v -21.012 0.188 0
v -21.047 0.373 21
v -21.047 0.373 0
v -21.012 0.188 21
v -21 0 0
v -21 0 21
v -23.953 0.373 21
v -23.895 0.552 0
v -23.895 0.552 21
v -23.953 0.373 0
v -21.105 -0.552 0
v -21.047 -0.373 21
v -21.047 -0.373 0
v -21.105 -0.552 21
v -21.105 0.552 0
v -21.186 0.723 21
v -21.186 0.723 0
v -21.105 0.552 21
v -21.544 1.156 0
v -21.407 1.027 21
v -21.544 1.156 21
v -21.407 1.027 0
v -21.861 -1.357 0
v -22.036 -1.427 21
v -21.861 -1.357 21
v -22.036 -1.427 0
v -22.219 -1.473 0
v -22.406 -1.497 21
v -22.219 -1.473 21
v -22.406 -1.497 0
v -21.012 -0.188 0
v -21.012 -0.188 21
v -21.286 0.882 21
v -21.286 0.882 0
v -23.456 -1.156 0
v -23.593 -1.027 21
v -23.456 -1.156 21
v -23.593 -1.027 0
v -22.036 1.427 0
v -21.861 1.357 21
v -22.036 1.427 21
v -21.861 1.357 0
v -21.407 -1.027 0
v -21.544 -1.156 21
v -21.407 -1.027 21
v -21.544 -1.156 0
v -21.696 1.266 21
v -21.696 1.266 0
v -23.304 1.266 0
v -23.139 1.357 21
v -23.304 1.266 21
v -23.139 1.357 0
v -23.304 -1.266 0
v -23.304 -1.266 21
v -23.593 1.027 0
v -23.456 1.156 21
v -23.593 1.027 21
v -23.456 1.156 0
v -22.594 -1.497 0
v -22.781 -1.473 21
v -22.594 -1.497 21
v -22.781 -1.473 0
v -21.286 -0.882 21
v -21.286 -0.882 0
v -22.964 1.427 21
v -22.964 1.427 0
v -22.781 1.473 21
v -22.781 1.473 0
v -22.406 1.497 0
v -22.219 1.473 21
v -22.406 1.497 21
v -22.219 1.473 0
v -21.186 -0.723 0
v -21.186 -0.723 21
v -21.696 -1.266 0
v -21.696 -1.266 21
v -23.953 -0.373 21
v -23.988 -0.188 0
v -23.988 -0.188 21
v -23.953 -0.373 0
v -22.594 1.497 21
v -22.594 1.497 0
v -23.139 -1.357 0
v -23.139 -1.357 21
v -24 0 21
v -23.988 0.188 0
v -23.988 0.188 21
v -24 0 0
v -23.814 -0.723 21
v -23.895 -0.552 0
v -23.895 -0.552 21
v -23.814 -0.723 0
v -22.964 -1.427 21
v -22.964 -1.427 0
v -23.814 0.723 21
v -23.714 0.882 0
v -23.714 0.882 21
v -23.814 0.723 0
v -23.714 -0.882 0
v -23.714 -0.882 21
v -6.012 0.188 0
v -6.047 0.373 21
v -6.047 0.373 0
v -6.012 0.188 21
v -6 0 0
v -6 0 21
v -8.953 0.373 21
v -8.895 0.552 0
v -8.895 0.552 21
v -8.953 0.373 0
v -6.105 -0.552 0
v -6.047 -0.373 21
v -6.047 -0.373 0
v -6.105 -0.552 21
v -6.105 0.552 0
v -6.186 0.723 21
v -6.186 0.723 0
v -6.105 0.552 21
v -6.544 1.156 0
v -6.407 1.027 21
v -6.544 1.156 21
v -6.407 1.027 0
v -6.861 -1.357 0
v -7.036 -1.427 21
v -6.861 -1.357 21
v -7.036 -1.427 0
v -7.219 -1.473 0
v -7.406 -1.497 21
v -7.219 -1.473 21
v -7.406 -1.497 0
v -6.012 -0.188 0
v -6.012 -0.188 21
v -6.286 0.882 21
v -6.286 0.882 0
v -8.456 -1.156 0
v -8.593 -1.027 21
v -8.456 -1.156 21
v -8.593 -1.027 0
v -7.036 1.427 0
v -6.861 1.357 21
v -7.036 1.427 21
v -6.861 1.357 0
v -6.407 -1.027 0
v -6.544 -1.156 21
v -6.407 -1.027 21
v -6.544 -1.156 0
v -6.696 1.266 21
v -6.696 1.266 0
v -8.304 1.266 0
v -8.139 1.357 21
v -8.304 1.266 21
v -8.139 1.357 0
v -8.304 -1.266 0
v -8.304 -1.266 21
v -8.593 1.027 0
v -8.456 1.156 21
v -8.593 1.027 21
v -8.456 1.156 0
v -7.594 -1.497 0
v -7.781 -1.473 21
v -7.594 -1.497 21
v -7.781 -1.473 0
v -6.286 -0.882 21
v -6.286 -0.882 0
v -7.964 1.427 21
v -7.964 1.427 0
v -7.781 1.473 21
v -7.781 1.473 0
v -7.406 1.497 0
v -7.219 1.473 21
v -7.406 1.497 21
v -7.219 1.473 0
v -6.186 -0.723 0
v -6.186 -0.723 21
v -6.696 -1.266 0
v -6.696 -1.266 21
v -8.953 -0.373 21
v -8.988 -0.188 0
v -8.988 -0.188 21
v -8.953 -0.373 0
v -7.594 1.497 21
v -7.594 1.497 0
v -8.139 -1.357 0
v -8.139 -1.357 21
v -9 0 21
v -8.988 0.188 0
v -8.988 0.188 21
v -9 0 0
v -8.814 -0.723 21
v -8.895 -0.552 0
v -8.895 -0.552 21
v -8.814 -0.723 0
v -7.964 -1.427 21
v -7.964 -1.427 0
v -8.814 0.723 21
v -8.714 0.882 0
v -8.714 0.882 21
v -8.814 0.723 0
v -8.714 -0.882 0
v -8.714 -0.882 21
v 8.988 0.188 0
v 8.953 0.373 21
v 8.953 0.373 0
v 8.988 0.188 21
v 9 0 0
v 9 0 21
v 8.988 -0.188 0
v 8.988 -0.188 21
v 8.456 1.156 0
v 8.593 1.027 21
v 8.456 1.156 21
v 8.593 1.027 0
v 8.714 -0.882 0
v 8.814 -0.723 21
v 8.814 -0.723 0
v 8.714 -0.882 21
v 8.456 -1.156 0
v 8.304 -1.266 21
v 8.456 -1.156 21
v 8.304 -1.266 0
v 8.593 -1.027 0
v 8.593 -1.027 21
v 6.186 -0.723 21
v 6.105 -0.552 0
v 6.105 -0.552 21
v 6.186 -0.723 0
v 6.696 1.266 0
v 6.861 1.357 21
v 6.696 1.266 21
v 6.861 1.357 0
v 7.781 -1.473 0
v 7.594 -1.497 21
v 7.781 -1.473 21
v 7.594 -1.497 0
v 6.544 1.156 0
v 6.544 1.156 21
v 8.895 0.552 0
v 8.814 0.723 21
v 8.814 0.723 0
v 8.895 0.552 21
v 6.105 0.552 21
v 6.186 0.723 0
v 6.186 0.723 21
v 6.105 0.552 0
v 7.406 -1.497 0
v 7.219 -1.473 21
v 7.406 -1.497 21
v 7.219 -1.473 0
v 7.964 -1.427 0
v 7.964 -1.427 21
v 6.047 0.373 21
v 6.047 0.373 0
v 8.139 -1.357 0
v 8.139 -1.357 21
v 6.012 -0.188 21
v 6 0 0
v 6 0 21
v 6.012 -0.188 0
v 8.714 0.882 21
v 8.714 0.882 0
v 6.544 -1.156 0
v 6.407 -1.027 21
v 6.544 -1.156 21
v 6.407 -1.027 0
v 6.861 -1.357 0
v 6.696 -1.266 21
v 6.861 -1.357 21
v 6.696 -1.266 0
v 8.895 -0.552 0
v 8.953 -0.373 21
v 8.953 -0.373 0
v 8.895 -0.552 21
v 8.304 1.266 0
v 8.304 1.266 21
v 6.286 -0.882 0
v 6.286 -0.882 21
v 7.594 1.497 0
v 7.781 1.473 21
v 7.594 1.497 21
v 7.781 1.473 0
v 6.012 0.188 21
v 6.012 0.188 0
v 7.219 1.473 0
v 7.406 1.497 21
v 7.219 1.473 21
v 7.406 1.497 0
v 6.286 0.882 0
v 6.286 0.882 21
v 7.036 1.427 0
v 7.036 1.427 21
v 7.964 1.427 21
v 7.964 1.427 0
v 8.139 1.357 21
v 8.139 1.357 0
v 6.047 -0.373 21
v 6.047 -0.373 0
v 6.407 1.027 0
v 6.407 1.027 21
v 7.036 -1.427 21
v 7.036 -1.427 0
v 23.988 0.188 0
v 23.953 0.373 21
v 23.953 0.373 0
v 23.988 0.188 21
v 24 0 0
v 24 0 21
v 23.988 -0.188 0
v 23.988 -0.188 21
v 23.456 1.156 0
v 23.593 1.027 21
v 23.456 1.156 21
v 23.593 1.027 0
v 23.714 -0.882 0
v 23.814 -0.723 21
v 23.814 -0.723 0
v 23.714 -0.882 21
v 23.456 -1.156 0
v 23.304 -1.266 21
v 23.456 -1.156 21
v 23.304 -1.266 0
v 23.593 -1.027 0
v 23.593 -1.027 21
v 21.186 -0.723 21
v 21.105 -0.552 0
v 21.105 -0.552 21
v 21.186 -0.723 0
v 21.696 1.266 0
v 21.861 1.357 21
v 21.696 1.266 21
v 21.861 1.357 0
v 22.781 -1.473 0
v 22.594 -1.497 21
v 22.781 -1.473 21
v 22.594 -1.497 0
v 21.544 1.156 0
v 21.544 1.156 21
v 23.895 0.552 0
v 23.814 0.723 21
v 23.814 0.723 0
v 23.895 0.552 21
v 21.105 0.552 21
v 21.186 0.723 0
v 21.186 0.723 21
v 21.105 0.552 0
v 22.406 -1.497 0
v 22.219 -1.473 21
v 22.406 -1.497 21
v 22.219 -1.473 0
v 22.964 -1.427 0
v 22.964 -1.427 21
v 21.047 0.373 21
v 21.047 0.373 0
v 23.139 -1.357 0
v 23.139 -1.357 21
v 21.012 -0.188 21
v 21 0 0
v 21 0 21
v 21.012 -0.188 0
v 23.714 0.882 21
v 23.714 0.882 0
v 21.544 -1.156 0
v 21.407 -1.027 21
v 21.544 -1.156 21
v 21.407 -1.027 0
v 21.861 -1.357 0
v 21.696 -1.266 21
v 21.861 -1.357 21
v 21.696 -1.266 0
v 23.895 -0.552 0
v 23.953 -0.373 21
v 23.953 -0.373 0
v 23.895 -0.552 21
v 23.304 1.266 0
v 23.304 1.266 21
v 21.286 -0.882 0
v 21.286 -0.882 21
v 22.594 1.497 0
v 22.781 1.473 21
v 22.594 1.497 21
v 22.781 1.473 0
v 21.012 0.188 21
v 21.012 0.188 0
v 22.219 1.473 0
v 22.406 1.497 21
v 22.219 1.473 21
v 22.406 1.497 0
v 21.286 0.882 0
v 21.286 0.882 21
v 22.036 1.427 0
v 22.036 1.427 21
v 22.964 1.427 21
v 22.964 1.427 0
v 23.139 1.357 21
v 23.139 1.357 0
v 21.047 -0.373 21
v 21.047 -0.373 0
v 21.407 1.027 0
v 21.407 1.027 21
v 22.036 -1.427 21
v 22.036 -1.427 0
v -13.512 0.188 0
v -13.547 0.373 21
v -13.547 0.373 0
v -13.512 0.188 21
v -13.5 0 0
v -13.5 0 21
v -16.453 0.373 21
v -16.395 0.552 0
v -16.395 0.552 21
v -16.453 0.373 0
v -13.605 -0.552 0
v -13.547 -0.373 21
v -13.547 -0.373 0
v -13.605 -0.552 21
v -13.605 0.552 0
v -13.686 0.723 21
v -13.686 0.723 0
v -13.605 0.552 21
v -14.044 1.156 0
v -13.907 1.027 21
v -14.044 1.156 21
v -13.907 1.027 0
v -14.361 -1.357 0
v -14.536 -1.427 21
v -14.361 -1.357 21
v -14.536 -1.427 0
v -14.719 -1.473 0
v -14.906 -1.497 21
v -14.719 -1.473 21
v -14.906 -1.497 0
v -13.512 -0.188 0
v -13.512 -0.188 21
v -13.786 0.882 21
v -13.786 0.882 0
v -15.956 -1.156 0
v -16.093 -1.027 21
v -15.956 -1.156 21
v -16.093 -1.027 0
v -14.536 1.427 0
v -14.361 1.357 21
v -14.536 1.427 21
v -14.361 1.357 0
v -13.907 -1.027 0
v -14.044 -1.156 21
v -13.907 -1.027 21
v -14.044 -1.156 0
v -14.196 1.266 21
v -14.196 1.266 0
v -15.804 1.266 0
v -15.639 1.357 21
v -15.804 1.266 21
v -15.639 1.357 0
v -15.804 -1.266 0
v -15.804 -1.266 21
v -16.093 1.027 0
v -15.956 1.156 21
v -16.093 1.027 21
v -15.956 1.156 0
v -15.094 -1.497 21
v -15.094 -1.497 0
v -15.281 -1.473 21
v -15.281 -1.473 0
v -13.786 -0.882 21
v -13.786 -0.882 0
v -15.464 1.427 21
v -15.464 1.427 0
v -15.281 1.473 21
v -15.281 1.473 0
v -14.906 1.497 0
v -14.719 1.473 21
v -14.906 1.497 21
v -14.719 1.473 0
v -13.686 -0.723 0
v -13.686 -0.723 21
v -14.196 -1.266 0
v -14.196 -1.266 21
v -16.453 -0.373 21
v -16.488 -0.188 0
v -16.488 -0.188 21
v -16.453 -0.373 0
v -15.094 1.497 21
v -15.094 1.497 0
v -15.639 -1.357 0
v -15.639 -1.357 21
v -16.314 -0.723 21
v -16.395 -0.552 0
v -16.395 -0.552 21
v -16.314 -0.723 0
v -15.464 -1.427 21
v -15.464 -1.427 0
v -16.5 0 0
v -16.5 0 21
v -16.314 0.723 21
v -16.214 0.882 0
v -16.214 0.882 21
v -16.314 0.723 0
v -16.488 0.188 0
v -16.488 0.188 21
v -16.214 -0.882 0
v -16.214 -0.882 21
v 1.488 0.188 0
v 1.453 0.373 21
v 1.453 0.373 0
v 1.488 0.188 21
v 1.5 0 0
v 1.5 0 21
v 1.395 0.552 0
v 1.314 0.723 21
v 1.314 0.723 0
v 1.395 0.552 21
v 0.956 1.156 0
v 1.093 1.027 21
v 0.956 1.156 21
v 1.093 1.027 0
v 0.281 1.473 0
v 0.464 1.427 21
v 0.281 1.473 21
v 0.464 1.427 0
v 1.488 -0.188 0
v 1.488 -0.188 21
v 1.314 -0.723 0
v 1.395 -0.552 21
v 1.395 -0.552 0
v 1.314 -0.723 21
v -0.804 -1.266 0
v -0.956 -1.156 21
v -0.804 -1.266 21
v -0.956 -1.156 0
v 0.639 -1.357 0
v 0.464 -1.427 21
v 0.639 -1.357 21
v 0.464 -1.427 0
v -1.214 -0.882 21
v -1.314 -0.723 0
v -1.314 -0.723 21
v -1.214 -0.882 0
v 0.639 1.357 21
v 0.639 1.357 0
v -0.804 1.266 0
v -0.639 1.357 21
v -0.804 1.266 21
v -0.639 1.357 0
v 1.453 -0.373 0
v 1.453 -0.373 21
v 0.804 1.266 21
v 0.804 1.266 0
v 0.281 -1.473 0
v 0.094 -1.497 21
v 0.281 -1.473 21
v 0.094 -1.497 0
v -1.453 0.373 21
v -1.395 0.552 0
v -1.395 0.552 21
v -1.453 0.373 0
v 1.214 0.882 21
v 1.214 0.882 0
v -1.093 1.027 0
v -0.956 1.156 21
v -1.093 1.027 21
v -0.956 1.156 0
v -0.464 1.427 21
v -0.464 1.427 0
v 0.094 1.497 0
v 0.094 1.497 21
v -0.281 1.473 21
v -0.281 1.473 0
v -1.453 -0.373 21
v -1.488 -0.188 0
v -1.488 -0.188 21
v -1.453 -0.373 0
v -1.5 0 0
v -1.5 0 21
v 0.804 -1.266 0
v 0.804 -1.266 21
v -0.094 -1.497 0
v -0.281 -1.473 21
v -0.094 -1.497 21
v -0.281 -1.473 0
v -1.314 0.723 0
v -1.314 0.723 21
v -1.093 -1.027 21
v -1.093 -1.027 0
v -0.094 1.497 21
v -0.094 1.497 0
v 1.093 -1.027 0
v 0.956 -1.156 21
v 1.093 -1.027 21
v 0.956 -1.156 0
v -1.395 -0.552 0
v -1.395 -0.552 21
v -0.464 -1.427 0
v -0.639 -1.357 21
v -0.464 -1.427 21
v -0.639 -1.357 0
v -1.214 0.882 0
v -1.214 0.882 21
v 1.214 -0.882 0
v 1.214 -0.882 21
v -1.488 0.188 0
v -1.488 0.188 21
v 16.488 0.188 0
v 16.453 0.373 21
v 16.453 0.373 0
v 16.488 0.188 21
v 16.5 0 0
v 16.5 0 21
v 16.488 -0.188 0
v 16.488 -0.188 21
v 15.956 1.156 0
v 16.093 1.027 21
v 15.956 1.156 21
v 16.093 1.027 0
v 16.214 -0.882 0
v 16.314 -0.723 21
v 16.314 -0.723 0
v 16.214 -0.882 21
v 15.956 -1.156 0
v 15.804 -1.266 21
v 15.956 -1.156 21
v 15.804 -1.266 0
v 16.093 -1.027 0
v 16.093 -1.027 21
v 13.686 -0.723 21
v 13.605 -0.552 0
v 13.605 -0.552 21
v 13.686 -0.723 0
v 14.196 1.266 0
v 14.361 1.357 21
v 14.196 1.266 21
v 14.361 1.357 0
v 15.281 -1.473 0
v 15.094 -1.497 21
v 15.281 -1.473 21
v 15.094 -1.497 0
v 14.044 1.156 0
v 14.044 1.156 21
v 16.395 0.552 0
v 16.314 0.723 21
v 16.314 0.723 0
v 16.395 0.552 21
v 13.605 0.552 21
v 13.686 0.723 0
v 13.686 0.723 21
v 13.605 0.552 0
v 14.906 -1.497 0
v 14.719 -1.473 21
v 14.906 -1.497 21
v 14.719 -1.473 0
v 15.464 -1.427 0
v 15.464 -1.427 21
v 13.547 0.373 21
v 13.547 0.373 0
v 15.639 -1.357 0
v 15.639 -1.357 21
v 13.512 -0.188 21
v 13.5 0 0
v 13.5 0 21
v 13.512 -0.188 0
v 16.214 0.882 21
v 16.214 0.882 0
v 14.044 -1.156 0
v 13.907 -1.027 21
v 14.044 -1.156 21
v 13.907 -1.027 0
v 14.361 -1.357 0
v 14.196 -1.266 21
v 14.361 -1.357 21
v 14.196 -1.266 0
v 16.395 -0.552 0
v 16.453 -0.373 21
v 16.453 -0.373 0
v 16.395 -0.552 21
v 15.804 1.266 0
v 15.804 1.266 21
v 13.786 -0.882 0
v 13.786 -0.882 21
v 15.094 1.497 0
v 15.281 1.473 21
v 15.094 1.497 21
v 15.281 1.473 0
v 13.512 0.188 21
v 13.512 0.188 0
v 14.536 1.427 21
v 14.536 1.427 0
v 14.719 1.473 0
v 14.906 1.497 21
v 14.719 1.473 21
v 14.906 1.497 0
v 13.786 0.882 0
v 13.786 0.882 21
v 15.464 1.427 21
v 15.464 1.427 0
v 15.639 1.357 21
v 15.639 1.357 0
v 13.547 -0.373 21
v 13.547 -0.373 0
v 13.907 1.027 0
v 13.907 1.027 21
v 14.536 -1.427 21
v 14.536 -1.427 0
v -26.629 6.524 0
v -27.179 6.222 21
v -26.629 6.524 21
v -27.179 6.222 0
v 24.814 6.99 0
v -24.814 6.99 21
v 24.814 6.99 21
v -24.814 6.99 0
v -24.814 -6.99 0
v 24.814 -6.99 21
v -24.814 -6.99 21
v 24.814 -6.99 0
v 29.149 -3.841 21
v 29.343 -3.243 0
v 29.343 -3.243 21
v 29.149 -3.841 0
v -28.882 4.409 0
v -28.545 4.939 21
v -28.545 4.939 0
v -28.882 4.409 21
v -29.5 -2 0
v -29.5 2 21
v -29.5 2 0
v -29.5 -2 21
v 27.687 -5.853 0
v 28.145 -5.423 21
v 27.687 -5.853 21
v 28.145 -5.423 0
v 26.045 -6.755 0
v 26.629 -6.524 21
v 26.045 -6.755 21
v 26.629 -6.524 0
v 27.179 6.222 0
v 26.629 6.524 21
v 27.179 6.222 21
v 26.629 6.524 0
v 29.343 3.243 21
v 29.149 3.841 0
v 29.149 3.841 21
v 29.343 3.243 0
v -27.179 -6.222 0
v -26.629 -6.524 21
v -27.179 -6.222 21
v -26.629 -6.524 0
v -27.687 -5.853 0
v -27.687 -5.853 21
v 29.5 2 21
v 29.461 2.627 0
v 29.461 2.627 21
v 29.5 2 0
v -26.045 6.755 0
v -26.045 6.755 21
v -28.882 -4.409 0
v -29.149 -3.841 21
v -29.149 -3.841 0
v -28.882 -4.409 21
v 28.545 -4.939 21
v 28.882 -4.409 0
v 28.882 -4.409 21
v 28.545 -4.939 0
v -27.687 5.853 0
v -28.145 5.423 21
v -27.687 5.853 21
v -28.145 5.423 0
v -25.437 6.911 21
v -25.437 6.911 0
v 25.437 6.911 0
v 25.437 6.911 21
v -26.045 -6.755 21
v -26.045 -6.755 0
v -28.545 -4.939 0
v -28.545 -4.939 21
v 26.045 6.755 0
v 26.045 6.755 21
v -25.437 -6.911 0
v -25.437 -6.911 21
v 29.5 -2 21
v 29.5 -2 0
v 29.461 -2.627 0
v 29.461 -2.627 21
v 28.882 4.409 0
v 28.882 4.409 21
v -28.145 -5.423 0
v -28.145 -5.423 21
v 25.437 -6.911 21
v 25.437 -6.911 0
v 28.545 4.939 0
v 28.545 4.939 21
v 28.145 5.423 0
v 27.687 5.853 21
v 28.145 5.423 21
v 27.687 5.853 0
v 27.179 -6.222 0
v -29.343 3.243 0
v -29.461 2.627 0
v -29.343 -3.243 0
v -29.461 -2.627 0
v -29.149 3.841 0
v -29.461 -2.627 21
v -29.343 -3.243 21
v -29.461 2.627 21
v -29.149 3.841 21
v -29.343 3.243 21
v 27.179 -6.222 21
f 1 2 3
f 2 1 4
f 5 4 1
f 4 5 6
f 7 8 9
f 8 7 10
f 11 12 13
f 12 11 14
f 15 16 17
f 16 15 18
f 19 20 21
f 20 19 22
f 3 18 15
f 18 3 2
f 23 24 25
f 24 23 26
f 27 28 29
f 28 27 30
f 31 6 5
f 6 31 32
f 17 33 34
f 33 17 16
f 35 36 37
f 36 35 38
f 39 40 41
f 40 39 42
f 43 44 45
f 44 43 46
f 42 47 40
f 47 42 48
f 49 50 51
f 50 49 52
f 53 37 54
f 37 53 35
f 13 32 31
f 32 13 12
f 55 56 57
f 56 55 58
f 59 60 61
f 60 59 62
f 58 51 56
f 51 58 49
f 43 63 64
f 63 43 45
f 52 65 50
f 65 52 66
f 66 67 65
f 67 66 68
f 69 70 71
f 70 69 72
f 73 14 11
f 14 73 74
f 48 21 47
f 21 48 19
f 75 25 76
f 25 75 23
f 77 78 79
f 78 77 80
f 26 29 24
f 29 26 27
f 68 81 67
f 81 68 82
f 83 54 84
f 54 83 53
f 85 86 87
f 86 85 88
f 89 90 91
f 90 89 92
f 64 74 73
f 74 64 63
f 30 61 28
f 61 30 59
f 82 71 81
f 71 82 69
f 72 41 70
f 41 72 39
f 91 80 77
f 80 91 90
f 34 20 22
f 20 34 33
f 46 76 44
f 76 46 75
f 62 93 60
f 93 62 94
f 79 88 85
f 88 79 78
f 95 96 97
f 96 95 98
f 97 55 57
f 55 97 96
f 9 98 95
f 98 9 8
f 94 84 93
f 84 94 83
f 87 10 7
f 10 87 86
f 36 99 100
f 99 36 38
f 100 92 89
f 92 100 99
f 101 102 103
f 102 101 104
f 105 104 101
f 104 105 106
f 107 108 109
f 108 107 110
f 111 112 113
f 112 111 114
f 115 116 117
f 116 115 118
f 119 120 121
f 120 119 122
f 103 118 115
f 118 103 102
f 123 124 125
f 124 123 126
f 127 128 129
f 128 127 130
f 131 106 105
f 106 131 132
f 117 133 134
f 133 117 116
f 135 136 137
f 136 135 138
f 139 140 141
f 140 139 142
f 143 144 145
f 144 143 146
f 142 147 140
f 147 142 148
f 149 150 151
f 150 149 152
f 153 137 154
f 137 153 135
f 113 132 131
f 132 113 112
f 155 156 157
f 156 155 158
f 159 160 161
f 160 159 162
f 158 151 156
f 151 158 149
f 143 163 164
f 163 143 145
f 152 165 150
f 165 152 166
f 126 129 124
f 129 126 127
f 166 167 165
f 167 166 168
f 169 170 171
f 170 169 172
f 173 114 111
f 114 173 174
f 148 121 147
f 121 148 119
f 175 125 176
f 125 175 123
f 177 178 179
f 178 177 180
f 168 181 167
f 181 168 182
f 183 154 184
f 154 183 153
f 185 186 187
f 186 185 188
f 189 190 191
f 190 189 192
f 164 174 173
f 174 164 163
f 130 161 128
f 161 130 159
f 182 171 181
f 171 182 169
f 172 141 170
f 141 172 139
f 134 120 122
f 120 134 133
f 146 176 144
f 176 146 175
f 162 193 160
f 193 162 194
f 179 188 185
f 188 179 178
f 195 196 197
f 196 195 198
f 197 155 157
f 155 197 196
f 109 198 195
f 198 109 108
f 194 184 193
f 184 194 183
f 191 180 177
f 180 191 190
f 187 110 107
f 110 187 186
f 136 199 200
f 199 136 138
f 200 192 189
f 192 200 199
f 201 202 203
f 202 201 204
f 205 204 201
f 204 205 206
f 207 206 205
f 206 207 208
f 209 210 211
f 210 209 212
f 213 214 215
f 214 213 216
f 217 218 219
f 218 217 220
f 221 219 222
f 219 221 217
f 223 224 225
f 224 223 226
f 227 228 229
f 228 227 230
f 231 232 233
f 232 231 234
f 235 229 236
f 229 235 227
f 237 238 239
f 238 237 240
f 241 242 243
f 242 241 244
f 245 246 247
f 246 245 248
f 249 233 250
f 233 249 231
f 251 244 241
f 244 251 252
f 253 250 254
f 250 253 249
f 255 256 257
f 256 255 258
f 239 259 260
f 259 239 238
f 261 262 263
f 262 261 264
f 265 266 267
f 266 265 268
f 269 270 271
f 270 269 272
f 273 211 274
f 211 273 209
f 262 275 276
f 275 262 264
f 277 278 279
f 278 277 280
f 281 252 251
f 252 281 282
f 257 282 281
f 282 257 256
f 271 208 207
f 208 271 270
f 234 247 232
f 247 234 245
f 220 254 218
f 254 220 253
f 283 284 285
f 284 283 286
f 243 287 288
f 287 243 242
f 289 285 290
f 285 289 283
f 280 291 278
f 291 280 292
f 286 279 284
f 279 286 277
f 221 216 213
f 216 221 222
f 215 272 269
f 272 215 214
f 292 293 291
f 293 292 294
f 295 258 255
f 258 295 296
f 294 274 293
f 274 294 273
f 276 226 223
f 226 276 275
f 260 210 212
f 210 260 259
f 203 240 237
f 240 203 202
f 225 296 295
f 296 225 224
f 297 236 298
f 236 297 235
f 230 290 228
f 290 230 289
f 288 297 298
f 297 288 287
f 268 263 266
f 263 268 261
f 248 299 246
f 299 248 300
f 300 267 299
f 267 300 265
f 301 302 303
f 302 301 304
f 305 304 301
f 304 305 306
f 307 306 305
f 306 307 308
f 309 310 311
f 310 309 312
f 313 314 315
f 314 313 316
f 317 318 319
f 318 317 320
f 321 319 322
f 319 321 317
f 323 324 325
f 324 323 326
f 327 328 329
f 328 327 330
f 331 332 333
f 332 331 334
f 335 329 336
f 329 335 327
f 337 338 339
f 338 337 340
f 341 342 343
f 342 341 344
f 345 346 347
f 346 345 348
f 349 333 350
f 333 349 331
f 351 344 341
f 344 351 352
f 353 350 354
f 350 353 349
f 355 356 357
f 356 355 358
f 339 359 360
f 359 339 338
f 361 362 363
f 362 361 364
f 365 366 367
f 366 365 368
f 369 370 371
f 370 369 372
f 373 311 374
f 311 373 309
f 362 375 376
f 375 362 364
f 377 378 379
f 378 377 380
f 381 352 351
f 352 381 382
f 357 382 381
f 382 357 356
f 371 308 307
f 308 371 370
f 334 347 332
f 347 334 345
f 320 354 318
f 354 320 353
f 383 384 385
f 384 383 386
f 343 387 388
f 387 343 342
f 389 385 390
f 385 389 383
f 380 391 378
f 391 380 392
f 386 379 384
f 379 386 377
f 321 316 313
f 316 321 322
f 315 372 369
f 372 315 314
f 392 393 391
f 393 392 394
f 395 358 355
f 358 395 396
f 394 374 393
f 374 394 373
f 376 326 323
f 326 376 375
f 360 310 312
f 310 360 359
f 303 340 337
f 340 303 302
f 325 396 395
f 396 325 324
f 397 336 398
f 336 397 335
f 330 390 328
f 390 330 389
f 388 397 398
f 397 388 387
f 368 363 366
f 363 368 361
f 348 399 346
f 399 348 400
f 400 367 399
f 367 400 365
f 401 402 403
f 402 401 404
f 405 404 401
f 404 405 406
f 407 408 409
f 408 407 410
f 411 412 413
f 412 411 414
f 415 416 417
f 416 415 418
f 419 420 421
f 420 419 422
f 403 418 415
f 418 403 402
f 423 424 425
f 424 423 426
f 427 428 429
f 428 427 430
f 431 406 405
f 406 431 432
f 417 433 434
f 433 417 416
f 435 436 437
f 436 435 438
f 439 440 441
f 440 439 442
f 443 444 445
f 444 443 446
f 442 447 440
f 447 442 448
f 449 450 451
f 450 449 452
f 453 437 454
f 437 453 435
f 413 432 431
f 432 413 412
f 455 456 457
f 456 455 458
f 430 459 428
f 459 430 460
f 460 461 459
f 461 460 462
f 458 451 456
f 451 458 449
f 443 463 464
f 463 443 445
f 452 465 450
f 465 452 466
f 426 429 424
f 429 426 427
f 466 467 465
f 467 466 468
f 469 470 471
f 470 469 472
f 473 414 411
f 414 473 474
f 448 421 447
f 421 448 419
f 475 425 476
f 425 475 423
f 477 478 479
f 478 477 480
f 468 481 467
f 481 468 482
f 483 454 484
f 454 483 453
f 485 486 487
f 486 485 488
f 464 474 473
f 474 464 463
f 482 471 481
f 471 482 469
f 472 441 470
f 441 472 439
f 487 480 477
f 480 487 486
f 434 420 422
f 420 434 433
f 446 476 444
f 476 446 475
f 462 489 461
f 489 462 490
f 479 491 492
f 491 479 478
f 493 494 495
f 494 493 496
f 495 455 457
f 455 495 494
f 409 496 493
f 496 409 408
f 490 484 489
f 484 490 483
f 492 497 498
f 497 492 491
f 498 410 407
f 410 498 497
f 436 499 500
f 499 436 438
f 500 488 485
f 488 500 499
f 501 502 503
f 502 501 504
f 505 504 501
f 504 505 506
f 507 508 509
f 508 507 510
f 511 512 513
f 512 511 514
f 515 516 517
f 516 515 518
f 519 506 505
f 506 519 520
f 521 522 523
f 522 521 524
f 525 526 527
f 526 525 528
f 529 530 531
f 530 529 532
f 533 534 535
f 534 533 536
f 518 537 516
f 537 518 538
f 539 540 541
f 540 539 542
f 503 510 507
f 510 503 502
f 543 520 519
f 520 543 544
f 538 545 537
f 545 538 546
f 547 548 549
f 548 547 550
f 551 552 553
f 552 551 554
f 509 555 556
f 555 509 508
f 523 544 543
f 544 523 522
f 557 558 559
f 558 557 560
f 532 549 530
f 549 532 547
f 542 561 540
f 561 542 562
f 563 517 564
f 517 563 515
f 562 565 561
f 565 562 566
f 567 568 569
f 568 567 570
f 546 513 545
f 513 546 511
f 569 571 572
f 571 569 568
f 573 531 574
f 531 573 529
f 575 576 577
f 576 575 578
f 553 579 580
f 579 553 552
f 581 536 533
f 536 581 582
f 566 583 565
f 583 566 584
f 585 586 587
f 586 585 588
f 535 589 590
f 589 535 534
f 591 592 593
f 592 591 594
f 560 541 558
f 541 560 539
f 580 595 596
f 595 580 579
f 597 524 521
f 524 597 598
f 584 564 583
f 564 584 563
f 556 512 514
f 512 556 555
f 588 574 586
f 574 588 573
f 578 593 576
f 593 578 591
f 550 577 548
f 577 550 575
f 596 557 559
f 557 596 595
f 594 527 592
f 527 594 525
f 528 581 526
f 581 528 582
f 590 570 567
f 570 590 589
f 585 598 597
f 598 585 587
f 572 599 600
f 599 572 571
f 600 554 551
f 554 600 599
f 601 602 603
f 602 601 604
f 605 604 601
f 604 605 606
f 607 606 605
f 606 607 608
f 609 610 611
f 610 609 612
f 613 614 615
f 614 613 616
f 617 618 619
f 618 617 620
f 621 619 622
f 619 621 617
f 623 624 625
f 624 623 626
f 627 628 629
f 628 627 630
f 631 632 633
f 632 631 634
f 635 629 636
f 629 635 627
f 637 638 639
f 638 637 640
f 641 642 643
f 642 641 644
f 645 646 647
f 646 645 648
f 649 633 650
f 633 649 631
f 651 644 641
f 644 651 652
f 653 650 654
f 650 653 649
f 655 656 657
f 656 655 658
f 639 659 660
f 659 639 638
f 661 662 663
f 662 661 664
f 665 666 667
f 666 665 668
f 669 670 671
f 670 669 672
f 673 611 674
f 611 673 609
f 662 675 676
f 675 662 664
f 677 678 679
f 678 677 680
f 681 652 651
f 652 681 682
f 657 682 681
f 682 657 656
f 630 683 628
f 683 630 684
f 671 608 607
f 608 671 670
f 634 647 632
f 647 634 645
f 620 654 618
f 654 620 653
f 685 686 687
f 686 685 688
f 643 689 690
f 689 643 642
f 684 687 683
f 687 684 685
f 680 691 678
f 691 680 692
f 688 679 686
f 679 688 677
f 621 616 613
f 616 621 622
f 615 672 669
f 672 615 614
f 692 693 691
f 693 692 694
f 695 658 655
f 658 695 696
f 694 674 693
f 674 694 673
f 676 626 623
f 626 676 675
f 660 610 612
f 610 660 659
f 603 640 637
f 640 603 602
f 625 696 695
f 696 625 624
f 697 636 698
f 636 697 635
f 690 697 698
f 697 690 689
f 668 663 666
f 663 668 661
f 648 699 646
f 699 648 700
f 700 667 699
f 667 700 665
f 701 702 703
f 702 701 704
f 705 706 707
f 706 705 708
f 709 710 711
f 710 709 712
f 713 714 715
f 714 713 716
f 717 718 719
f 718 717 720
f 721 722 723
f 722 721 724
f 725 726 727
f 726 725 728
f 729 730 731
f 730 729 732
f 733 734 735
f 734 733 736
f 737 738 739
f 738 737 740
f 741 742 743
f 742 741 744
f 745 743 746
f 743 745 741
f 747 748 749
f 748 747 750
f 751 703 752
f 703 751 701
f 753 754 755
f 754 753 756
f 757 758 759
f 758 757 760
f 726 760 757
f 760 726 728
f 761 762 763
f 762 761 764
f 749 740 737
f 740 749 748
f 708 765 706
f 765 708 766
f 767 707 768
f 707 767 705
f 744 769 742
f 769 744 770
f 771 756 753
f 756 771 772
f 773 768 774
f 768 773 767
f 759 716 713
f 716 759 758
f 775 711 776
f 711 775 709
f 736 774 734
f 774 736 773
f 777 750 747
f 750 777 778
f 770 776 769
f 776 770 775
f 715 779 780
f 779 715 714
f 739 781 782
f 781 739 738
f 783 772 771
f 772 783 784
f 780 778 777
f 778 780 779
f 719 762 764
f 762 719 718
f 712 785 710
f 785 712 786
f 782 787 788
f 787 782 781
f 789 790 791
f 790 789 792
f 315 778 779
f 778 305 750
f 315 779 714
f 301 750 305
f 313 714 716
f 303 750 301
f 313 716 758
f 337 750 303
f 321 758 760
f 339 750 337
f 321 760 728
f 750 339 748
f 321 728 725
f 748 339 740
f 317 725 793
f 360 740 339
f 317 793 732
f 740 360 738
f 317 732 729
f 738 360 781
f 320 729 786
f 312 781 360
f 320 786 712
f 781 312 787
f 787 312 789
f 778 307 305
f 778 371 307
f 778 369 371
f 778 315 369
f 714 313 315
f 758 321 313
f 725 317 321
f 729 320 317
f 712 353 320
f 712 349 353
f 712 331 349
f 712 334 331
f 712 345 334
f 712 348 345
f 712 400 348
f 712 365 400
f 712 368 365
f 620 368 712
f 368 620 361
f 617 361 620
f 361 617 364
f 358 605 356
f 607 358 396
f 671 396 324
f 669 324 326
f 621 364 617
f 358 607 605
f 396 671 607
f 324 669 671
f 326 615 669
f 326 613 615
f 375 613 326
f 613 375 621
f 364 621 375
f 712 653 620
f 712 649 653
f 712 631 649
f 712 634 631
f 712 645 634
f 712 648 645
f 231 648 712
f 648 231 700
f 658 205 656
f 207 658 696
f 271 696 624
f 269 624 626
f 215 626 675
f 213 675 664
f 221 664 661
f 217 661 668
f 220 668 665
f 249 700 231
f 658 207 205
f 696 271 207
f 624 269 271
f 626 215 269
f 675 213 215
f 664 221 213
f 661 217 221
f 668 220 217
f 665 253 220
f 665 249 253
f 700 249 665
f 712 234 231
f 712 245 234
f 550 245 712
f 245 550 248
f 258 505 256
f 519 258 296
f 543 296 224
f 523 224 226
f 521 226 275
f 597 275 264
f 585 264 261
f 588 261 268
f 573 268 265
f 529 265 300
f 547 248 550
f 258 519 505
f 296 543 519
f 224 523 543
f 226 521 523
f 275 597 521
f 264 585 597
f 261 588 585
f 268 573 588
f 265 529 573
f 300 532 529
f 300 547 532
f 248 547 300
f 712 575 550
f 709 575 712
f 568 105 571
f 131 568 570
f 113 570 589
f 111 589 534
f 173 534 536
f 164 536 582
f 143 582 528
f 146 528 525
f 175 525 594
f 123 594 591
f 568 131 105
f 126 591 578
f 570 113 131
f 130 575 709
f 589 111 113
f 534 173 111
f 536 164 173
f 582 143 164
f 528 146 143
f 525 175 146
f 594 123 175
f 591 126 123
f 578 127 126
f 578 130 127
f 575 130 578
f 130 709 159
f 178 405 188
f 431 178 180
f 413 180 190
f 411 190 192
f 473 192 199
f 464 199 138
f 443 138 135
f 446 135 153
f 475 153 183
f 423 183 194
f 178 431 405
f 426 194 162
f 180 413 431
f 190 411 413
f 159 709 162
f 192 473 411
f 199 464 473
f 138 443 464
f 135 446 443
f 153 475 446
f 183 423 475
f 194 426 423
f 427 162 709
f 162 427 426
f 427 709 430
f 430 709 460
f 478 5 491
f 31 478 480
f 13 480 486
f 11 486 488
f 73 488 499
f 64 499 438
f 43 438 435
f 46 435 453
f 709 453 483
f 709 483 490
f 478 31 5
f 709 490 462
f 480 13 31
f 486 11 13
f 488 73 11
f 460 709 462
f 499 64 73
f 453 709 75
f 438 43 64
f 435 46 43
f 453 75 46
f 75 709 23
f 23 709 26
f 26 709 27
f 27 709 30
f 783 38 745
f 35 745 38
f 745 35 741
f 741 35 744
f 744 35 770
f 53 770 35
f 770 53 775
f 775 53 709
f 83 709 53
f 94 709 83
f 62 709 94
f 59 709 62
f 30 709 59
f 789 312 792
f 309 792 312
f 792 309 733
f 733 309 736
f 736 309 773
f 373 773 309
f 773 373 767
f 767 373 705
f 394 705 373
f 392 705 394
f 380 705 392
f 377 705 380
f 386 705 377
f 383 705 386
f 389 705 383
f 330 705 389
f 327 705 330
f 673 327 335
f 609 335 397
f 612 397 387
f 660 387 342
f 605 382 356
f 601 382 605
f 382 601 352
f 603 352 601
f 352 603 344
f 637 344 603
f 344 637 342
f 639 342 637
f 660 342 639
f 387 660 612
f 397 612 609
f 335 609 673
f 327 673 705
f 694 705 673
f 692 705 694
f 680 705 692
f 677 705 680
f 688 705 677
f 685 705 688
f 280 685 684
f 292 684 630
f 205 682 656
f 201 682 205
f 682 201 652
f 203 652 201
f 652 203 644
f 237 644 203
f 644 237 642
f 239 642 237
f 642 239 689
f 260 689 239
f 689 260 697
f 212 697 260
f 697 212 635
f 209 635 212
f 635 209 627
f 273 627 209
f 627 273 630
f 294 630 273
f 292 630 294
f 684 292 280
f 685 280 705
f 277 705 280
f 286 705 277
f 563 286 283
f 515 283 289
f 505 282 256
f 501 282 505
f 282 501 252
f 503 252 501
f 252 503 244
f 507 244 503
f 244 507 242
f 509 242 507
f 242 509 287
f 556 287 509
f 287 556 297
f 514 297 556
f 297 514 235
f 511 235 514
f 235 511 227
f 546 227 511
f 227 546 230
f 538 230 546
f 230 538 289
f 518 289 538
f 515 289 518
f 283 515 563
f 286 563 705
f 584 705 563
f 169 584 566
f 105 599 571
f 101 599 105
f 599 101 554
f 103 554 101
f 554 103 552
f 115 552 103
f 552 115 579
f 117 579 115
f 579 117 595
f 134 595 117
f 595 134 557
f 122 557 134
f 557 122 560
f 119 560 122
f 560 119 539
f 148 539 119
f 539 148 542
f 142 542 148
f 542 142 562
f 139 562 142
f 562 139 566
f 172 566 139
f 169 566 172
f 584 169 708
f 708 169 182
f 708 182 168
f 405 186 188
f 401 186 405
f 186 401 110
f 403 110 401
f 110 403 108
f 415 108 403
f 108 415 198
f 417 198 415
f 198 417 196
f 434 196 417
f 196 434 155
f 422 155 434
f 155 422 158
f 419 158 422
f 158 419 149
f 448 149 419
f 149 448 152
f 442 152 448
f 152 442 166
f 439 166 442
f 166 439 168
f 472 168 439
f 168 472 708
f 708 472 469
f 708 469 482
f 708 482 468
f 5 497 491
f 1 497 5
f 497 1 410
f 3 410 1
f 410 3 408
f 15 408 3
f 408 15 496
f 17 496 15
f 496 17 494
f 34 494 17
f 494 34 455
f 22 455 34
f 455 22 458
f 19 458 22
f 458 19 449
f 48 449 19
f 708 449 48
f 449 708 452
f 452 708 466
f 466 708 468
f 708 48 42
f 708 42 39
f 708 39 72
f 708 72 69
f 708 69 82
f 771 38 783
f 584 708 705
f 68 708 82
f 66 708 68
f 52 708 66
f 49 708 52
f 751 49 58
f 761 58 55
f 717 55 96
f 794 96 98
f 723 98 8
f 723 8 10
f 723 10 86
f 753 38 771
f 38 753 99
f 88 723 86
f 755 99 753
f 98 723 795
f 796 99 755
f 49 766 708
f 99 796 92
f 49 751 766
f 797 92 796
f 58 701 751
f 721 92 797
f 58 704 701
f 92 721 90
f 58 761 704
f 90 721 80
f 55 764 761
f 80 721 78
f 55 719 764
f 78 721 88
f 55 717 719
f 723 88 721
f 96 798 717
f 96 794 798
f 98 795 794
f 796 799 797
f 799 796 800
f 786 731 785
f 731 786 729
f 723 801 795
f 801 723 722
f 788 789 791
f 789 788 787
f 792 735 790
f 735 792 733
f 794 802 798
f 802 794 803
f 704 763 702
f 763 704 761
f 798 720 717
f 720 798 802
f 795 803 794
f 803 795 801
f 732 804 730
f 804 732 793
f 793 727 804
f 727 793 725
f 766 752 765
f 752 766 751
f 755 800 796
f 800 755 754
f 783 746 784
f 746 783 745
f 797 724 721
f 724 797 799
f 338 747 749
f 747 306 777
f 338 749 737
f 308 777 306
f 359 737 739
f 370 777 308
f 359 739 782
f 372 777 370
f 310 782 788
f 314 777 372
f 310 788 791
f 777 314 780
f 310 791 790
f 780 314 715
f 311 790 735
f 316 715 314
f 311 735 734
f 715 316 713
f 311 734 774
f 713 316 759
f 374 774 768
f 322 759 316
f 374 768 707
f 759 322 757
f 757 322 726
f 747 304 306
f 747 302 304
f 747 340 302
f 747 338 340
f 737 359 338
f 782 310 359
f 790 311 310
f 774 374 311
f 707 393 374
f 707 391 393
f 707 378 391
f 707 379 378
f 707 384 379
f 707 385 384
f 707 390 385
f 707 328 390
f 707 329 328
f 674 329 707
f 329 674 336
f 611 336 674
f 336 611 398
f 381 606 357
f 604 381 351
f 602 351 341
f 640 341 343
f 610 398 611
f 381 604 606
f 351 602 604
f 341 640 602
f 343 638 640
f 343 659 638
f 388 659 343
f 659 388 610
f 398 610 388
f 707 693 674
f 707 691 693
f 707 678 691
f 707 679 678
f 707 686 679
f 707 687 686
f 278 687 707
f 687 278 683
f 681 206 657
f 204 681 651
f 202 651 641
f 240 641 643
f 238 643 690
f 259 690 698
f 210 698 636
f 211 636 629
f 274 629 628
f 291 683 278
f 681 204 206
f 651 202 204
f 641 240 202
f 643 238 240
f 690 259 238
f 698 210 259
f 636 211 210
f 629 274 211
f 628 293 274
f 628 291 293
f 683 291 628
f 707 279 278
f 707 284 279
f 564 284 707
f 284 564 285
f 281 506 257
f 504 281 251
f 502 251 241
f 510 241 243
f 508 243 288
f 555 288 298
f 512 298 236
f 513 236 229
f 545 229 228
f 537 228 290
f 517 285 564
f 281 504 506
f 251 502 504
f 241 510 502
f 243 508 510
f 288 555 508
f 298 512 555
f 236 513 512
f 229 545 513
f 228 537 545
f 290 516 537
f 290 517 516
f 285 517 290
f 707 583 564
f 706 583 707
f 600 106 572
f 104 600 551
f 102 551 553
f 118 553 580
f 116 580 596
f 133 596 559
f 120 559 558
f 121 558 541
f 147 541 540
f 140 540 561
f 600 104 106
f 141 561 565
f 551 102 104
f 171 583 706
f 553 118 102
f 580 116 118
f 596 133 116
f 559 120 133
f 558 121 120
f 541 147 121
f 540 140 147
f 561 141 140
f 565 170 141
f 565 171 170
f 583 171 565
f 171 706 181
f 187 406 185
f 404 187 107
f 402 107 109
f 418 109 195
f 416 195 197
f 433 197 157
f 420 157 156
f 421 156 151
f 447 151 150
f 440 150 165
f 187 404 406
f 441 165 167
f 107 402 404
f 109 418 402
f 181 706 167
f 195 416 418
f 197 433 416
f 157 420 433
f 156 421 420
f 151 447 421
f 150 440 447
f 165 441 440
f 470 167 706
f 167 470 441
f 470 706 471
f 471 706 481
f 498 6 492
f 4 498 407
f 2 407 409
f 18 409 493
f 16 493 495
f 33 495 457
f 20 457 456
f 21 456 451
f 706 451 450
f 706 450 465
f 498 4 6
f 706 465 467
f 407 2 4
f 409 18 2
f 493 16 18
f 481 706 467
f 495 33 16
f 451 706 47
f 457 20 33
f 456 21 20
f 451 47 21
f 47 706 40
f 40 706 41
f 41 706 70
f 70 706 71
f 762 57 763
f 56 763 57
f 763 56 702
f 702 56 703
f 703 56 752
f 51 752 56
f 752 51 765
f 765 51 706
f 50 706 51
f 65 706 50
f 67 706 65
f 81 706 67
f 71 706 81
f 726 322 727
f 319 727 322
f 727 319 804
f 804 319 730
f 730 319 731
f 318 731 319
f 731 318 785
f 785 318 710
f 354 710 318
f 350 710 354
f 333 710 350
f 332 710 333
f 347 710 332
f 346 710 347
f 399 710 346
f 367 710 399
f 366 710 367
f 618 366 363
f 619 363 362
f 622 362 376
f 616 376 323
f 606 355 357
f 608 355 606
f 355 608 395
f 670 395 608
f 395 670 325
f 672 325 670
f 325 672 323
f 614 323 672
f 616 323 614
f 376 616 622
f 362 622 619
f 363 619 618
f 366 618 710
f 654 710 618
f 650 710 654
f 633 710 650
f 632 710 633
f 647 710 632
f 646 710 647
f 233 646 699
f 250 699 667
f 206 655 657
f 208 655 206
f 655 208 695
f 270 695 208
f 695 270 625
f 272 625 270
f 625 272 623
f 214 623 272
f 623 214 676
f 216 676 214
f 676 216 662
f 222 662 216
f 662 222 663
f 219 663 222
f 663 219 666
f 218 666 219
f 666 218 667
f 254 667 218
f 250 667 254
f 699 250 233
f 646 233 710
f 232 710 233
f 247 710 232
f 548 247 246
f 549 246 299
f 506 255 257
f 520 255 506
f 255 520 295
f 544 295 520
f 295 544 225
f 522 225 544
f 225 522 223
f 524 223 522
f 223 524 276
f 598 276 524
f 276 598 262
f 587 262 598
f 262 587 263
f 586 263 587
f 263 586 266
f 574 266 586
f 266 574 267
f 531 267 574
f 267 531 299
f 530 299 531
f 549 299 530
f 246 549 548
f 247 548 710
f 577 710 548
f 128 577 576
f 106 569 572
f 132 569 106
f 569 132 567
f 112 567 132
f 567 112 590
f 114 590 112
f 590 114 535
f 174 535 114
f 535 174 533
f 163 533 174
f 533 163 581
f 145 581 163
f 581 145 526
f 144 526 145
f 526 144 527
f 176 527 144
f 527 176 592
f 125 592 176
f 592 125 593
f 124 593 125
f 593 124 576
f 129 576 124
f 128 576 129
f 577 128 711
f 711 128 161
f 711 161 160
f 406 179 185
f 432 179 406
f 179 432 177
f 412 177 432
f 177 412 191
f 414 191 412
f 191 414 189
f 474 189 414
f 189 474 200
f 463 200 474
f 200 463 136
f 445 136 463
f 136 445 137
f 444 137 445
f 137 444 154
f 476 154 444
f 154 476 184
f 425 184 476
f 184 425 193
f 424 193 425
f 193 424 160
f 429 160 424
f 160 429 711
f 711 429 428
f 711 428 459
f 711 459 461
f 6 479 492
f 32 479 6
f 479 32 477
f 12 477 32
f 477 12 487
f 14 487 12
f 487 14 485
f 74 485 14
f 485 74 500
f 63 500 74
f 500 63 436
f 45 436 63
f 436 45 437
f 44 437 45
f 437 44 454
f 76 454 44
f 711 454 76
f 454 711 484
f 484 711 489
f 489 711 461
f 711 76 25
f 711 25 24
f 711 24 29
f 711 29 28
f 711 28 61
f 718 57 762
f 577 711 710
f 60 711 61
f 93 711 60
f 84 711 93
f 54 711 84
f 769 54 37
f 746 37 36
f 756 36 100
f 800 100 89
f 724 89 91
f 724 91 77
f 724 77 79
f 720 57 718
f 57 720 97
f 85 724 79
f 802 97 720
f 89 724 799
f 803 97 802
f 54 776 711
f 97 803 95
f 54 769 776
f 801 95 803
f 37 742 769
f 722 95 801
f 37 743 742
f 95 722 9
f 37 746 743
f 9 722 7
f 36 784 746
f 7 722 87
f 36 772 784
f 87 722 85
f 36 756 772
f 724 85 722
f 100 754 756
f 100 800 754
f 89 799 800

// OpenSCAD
$fn = 50;


difference() {
	union() {
		hull() {
			translate(v = [-24.5000000000, 2.0000000000, 0]) {
				cylinder(h = 21, r = 5);
			}
			translate(v = [24.5000000000, 2.0000000000, 0]) {
				cylinder(h = 21, r = 5);
			}
			translate(v = [-24.5000000000, -2.0000000000, 0]) {
				cylinder(h = 21, r = 5);
			}
			translate(v = [24.5000000000, -2.0000000000, 0]) {
				cylinder(h = 21, r = 5);
			}
		}
	}
	union() {
		translate(v = [-22.5000000000, 0.0000000000, 0]) {
			translate(v = [0, 0, -100]) {
				cylinder(h = 200, r = 1.5000000000);
			}
		}
		translate(v = [-7.5000000000, 0.0000000000, 0]) {
			translate(v = [0, 0, -100]) {
				cylinder(h = 200, r = 1.5000000000);
			}
		}
		translate(v = [7.5000000000, 0.0000000000, 0]) {
			translate(v = [0, 0, -100]) {
				cylinder(h = 200, r = 1.5000000000);
			}
		}
		translate(v = [22.5000000000, 0.0000000000, 0]) {
			translate(v = [0, 0, -100]) {
				cylinder(h = 200, r = 1.5000000000);
			}
		}
		translate(v = [-22.5000000000, 0.0000000000, 0]) {
			translate(v = [0, 0, -100]) {
				cylinder(h = 200, r = 1.5000000000);
			}
		}
		translate(v = [-15.0000000000, 0.0000000000, 0]) {
			translate(v = [0, 0, -100]) {
				cylinder(h = 200, r = 1.5000000000);
			}
		}
		translate(v = [-7.5000000000, 0.0000000000, 0]) {
			translate(v = [0, 0, -100]) {
				cylinder(h = 200, r = 1.5000000000);
			}
		}
		translate(v = [0, 0, -100]) {
			cylinder(h = 200, r = 1.5000000000);
		}
		translate(v = [7.5000000000, 0.0000000000, 0]) {
			translate(v = [0, 0, -100]) {
				cylinder(h = 200, r = 1.5000000000);
			}
		}
		translate(v = [15.0000000000, 0.0000000000, 0]) {
			translate(v = [0, 0, -100]) {
				cylinder(h = 200, r = 1.5000000000);
			}
		}
		translate(v = [22.5000000000, 0.0000000000, 0]) {
			translate(v = [0, 0, -100]) {
				cylinder(h = 200, r = 1.5000000000);
			}
		}
	}
}
